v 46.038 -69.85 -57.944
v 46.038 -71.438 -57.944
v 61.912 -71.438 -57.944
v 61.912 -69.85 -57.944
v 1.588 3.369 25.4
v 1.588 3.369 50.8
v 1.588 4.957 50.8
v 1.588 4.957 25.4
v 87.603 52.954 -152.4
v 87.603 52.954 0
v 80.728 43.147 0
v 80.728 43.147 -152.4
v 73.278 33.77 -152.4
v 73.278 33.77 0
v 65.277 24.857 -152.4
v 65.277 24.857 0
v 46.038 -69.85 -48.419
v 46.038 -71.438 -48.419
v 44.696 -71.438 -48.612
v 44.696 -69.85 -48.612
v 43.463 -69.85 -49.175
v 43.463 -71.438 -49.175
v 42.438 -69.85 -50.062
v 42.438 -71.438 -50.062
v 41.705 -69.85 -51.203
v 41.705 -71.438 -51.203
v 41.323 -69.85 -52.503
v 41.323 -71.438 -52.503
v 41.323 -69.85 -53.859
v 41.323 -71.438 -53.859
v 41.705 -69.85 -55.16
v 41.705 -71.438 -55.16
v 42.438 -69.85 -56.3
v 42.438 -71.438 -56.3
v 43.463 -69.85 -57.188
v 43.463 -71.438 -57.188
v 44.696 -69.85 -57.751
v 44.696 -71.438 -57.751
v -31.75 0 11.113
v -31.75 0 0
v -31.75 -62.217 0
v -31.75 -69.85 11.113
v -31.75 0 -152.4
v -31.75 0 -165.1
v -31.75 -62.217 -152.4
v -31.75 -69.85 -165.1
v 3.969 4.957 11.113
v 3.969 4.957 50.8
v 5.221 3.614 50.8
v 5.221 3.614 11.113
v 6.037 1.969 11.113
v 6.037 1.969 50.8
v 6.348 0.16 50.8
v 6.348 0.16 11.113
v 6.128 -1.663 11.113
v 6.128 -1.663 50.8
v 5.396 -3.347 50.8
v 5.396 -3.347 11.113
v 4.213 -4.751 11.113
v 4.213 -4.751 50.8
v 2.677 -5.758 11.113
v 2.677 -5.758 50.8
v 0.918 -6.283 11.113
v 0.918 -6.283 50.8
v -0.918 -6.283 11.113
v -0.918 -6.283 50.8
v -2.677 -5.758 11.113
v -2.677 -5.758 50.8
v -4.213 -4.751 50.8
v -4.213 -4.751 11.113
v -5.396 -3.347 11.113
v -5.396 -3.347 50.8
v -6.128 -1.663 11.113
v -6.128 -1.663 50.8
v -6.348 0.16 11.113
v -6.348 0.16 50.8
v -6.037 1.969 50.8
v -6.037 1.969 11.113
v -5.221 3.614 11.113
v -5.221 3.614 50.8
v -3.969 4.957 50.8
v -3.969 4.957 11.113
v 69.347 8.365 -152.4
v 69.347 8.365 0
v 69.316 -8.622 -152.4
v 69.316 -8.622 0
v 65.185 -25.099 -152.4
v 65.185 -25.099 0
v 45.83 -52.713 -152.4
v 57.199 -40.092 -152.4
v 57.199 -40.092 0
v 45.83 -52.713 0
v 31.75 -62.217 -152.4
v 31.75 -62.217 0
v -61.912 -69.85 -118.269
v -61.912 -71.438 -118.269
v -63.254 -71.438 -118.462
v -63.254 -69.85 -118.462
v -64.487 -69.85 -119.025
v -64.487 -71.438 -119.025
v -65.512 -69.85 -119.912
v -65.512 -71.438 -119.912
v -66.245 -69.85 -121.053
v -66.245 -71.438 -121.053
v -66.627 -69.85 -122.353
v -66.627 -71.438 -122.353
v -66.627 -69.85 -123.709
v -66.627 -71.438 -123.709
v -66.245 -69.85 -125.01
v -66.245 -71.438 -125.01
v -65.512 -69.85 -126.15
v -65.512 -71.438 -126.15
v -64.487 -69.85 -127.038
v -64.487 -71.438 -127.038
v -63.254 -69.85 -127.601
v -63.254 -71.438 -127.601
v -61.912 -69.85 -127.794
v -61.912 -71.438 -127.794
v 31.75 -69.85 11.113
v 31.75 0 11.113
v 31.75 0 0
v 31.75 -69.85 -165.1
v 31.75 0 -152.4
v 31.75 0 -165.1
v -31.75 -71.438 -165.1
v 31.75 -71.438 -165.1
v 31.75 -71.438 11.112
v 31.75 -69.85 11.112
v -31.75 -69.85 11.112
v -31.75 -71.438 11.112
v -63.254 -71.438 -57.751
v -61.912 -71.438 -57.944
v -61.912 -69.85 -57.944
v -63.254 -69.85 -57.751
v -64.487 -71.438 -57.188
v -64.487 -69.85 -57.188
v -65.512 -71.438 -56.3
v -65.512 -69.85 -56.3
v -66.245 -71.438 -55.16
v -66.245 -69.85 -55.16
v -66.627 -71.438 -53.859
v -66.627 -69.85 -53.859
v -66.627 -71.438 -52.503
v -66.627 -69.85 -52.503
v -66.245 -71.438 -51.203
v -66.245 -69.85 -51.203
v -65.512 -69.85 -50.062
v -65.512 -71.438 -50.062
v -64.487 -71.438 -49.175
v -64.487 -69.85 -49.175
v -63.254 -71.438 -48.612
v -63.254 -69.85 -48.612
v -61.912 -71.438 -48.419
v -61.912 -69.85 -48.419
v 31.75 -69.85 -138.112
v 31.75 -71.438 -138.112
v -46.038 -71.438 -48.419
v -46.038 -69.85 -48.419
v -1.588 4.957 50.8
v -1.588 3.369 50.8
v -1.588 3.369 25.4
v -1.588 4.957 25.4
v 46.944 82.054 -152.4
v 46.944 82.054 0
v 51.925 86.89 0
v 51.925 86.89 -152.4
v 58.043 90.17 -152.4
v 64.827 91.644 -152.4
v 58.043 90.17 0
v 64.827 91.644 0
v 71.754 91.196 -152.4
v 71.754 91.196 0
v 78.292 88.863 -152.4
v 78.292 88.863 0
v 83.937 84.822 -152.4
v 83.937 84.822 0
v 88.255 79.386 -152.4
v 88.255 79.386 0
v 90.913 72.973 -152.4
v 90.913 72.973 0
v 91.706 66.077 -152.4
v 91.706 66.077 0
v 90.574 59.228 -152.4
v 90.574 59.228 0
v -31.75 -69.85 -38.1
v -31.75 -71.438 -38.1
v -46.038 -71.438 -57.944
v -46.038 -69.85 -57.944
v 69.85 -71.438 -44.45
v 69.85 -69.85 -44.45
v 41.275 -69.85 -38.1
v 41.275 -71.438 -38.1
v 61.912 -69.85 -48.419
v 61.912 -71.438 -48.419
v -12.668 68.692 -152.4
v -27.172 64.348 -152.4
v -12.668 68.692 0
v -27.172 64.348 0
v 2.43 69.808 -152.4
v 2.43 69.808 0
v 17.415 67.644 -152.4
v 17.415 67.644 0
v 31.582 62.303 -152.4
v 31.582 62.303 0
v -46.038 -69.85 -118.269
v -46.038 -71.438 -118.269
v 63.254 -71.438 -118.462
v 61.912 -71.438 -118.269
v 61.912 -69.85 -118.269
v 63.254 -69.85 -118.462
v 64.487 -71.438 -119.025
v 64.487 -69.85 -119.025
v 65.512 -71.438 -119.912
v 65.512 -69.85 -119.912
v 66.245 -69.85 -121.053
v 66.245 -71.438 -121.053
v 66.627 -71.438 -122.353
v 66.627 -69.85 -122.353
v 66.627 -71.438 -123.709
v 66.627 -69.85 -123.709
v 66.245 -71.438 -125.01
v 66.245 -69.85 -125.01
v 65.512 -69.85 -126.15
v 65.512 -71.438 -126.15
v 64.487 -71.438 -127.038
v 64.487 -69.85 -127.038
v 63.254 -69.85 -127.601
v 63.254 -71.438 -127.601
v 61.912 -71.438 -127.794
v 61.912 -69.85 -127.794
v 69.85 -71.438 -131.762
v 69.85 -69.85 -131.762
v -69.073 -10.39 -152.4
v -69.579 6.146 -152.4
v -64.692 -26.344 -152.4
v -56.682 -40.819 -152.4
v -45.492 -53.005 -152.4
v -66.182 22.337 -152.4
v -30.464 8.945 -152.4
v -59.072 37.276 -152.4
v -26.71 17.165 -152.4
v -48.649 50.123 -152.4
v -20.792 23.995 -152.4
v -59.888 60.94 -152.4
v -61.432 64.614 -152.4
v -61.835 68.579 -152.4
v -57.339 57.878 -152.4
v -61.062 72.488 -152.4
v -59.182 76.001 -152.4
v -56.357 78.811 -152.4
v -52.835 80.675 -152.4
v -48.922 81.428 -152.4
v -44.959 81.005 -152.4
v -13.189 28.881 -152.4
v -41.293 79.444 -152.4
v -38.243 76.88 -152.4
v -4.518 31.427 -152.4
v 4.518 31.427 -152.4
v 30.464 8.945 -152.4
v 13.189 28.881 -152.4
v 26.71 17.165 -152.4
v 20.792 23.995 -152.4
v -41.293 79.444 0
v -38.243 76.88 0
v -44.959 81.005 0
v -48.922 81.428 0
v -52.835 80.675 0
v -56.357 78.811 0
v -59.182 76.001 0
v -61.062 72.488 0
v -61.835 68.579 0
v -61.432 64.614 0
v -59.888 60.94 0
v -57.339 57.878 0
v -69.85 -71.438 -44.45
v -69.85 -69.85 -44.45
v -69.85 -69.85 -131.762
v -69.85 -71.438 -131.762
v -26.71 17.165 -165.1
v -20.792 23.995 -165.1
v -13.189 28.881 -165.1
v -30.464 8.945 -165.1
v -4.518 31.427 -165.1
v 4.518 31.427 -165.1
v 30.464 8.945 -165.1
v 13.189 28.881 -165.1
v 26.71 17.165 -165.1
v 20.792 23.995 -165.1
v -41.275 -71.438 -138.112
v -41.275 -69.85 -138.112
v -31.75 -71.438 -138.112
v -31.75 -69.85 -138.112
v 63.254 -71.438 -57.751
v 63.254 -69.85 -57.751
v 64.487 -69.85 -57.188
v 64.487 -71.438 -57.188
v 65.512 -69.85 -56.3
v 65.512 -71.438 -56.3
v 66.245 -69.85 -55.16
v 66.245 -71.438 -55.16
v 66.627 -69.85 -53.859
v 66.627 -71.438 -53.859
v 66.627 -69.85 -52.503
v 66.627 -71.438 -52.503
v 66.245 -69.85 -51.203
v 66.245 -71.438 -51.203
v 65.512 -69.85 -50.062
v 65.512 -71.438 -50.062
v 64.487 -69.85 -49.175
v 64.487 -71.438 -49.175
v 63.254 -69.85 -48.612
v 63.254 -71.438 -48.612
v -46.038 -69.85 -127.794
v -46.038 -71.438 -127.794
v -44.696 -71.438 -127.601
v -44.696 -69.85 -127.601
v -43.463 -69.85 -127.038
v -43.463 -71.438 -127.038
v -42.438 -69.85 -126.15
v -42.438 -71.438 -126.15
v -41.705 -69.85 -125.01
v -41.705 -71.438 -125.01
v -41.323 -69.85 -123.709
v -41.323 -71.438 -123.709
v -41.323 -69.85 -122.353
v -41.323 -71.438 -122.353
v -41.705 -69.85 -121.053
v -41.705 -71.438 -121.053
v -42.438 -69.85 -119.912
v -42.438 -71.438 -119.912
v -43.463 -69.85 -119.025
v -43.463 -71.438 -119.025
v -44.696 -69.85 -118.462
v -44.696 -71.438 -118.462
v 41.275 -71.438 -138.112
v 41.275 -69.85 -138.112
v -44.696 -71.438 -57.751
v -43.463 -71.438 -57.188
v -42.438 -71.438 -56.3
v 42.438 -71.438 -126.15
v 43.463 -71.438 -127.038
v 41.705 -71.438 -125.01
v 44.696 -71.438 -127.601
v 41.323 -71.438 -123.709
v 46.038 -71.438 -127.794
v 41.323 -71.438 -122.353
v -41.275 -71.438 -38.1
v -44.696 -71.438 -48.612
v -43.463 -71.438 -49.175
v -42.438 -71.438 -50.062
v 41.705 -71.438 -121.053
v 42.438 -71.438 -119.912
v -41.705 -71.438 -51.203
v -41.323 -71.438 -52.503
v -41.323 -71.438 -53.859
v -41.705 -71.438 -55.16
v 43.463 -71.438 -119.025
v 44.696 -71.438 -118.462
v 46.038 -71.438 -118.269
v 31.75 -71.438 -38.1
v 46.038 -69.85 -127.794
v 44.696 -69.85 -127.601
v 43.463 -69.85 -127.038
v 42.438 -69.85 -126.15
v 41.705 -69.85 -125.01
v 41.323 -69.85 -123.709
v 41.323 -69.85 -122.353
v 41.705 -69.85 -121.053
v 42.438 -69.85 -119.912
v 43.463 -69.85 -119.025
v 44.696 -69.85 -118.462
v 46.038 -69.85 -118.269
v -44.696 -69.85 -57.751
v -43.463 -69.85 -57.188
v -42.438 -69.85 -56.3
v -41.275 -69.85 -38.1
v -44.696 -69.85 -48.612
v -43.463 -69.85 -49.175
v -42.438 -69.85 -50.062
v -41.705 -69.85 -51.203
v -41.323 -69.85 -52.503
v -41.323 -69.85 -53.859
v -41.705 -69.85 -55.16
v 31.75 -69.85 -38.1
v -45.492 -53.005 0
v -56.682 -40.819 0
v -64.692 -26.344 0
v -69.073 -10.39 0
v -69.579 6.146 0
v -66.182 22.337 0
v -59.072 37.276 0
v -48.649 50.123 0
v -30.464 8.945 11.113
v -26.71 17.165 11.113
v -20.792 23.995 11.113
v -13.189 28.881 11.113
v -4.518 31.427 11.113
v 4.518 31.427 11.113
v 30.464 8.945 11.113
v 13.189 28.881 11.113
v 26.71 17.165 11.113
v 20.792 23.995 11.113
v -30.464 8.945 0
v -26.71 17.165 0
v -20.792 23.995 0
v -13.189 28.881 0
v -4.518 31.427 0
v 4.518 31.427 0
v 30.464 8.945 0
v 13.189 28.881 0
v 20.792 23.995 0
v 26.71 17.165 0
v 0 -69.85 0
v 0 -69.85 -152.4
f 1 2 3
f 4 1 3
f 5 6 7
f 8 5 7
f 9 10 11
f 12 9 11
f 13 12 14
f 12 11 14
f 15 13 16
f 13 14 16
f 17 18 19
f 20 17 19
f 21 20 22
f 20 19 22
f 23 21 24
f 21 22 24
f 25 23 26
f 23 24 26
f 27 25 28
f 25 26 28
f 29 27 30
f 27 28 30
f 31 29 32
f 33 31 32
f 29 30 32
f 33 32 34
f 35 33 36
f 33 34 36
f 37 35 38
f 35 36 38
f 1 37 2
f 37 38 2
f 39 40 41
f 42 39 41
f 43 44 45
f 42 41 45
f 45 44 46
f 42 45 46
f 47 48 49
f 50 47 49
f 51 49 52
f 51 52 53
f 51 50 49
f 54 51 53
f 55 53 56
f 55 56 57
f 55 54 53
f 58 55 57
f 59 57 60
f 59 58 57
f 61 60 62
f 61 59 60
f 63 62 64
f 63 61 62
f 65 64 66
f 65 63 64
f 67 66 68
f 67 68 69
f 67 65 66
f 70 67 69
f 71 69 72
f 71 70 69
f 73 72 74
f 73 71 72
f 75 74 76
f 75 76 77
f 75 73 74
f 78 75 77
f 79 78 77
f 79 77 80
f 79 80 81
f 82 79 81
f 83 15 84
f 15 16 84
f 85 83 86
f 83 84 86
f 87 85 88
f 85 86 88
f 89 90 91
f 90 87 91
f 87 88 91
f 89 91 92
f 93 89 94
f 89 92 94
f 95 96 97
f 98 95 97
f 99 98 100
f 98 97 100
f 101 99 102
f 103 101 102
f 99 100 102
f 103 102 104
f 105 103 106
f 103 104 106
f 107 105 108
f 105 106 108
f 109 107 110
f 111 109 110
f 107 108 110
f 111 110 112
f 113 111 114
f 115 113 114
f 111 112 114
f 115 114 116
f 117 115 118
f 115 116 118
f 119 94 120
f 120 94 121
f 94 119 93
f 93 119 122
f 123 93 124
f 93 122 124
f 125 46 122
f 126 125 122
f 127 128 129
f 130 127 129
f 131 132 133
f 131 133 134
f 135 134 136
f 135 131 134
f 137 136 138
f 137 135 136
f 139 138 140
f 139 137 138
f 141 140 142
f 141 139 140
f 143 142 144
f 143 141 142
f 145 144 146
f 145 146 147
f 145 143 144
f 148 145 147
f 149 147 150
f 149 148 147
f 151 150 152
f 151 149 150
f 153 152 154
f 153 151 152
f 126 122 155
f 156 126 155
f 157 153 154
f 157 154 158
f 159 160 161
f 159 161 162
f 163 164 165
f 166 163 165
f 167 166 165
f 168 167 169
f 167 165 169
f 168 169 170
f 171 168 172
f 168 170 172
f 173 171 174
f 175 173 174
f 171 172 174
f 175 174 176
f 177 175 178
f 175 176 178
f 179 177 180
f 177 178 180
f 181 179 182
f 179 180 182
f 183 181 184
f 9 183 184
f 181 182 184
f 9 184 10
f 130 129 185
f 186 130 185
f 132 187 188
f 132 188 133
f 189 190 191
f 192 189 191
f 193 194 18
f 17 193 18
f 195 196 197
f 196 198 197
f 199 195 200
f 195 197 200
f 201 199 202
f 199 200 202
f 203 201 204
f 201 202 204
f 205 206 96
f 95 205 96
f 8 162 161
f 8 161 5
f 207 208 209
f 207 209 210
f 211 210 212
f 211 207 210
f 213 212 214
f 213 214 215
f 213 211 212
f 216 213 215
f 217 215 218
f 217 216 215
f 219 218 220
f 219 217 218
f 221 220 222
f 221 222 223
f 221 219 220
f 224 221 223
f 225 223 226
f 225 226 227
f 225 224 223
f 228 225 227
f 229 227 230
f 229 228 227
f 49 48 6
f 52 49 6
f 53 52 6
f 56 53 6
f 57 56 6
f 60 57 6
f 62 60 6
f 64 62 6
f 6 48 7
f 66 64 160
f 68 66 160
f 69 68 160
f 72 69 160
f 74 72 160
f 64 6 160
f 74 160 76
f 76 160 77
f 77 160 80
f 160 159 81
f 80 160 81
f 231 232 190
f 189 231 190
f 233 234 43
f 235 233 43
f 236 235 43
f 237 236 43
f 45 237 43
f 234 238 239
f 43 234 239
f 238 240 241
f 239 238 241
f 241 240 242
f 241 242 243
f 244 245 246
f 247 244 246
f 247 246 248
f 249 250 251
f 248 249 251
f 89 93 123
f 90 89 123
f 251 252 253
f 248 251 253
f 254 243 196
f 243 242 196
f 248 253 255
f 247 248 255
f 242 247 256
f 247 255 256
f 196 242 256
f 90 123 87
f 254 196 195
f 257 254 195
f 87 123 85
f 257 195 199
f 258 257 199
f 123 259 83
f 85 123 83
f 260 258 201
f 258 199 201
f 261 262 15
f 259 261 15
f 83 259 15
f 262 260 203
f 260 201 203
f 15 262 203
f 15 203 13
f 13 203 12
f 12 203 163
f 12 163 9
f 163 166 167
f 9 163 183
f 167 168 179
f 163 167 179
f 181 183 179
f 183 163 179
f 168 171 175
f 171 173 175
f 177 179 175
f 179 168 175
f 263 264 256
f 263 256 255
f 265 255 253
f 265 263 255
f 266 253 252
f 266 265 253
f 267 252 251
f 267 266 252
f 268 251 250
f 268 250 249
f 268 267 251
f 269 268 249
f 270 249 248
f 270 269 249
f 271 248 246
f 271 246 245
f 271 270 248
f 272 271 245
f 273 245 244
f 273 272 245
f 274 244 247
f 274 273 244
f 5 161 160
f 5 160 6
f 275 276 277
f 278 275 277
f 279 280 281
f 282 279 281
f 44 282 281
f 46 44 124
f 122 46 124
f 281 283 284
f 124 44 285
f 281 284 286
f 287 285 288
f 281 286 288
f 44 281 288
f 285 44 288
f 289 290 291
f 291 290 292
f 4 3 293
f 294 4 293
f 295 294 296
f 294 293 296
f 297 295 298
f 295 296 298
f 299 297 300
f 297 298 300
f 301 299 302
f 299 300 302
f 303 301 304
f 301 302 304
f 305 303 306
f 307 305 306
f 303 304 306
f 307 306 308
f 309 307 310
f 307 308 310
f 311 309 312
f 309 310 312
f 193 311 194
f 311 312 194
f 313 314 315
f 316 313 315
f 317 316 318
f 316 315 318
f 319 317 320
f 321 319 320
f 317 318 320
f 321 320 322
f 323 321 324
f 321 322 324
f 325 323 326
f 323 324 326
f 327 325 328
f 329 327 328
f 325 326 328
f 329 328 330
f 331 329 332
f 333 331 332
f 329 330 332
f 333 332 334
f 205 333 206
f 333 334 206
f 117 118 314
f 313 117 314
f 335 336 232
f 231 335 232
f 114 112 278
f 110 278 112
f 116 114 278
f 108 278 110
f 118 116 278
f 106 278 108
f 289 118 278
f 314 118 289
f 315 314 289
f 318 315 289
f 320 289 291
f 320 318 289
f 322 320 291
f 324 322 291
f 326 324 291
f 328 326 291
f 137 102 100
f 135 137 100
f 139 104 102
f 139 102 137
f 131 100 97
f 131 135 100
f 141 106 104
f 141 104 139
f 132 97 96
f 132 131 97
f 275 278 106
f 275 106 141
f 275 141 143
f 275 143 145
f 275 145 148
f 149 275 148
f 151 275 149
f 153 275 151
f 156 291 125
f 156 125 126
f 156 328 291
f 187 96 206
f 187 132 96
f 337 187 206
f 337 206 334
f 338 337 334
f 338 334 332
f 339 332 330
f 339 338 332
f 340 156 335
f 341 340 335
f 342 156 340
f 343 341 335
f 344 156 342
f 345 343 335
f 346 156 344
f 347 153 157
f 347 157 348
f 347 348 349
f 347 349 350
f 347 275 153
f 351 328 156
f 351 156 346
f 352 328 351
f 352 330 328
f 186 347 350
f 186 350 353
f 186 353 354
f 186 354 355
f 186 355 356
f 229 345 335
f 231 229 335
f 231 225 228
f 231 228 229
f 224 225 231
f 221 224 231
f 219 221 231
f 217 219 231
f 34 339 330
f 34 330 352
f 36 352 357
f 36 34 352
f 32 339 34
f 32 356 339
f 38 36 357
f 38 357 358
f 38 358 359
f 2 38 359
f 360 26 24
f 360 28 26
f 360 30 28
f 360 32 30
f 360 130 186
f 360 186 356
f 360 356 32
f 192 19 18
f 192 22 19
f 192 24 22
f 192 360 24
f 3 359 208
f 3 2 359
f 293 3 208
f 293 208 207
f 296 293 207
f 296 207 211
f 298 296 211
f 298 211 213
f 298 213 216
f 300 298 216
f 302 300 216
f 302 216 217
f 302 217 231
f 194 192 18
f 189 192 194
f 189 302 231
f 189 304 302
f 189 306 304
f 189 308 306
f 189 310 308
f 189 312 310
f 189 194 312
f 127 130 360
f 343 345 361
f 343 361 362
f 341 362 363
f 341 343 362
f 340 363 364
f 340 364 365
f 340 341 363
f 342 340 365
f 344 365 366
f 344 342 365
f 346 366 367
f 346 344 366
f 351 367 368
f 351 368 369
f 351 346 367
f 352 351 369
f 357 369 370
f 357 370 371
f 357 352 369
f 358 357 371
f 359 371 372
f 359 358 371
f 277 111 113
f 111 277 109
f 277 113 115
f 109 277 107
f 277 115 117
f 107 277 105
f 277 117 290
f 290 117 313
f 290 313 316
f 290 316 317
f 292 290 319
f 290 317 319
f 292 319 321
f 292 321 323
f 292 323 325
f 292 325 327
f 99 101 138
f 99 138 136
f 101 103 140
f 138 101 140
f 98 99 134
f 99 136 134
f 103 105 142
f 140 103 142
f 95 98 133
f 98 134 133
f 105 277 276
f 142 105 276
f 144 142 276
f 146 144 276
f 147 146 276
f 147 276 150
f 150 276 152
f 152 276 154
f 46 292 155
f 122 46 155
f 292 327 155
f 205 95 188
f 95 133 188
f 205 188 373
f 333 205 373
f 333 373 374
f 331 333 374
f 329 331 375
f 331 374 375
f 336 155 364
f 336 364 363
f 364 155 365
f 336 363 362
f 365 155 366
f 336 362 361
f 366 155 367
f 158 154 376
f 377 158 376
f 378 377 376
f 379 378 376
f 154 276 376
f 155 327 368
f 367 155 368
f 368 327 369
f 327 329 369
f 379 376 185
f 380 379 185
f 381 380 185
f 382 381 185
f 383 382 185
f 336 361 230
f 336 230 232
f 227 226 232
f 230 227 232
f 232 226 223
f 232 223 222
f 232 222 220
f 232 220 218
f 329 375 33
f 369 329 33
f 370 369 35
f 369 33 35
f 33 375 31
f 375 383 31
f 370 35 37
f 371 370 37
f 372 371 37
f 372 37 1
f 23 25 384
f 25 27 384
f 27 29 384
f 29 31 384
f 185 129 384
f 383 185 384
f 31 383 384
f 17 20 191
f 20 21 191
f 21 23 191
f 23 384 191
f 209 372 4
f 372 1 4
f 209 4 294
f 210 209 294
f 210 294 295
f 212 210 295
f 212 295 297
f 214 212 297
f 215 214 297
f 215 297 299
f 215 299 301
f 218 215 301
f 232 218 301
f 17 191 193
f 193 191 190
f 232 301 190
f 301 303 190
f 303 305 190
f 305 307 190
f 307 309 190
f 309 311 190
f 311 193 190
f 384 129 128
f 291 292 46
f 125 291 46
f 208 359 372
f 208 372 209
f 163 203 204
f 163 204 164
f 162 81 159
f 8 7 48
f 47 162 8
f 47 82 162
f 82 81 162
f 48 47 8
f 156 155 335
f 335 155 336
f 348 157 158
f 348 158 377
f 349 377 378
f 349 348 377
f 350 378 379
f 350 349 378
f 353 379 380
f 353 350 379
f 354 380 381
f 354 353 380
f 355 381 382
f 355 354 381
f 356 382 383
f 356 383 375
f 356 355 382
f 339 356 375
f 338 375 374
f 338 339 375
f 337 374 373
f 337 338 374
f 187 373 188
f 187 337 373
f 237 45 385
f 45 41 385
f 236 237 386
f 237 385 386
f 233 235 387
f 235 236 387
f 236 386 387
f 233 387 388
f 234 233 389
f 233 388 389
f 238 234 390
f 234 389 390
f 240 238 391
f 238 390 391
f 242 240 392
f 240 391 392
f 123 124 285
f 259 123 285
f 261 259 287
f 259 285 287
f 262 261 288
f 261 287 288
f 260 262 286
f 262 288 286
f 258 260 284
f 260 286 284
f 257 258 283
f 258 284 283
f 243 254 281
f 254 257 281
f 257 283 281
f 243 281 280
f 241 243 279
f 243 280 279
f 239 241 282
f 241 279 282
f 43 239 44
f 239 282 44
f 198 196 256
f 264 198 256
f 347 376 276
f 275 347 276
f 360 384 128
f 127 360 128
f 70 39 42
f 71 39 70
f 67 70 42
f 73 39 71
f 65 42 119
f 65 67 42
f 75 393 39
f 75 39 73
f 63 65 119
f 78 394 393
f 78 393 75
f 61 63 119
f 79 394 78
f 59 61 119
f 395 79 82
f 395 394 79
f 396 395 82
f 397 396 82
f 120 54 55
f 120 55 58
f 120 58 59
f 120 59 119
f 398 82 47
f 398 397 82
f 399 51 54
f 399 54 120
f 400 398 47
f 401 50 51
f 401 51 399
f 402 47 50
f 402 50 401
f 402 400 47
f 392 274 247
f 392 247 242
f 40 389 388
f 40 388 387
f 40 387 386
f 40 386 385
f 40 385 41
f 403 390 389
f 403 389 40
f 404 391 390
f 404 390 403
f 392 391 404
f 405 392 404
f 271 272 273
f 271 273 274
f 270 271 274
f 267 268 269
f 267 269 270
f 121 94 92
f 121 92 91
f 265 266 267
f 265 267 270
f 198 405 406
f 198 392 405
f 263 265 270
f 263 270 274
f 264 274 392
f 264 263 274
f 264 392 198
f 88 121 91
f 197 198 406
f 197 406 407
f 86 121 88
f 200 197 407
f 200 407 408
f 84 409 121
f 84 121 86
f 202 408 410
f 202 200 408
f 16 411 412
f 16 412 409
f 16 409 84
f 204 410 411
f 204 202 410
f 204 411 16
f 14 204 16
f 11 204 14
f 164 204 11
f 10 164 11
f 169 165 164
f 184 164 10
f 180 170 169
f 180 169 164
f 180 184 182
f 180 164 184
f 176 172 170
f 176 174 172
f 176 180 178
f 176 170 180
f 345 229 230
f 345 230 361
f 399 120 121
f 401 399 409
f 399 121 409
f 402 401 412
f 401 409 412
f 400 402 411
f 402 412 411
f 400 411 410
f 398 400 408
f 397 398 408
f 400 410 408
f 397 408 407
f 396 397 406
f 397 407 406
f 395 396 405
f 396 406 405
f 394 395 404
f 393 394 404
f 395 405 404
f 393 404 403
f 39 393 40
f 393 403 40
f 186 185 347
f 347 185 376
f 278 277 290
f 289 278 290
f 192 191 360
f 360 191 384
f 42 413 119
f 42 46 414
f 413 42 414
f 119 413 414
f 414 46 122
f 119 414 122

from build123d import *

# Parameters (mm, degrees)
BOSS_EXTRUDE1_DEPTH      = 50.8
SKETCH2_R                = 69.85
BOSS_EXTRUDE2_DEPTH      = 152.4
BOSS_EXTRUDE3_DEPTH      = 11.1125
BOSS_EXTRUDE3_DEPTH_BACK = 165.1
BOSS_EXTRUDE4_DEPTH      = 1.5875
CUT_EXTRUDE1_DEPTH       = 1.5875
BOSS_EXTRUDE5_DEPTH      = 152.4
SKETCH7_W                = 3.175
SKETCH7_H                = 1.5875
CUT_EXTRUDE2_DEPTH       = 25.4


with BuildPart() as part:
    # Sketch1 → Boss-Extrude1 (new body)
    with BuildSketch(Plane.XY):
        with BuildLine():
            Line((-3.96875, 4.956967161), (3.96875, 4.956967161))
            ThreePointArc((3.96875, 4.956967161), (0, -6.35), (-3.96875, 4.956967161))
        make_face()
    extrude(amount=BOSS_EXTRUDE1_DEPTH)

    # Sketch2 → Boss-Extrude2 (add)
    with BuildSketch(Plane(origin=(0, 0, 0), x_dir=(-1, 0, 0), z_dir=(0, 0, -1))):
        with Locations(Location((0, 0, 0), (0, 0, 180))):
            Circle(SKETCH2_R)
    extrude(amount=BOSS_EXTRUDE2_DEPTH)

    # Sketch3 → Boss-Extrude3 (add, two sides: drawn at the far end of the back side and taken through both)
    with BuildSketch(Plane.XY.offset(-BOSS_EXTRUDE3_DEPTH_BACK)):
        with BuildLine():
            Line((-31.75, 0), (-31.75, -69.85))
            Line((-31.75, -69.85), (31.75, -69.85))
            Line((31.75, -69.85), (31.75, 0))
            ThreePointArc((31.75, 0), (0, 31.75), (-31.75, 0))
        make_face()
    extrude(amount=BOSS_EXTRUDE3_DEPTH + BOSS_EXTRUDE3_DEPTH_BACK)

    # Sketch6 → Boss-Extrude5 (add)
    with BuildSketch(Plane.XY):
        with BuildLine():
            Line((-57.339496862, 57.877511192), (-43.213350378, 45.2729749))
            Line((-43.213350378, 45.2729749), (-24.981535219, 61.868601519))
            Line((-24.981535219, 61.868601519), (-38.242972103, 76.879791128))
            ThreePointArc((-38.242972103, 76.879791128), (-57.873547409, 77.510968918), (-57.339496862, 57.877511192))
        make_face()
        with BuildLine():
            Line((22.296433765, 50.36440818), (46.944158333, 82.054339768))
            ThreePointArc((46.944158333, 82.054339768), (81.255533225, 87.039254438), (87.603107082, 52.953654438))
            ThreePointArc((87.603107082, 52.953654438), (74.164851505, 34.827489865), (58.76527868, 18.335136731))
            ThreePointArc((58.76527868, 18.335136731), (42.207462237, 36.258772628), (22.296433765, 50.36440818))
        make_face()
    extrude(amount=-BOSS_EXTRUDE5_DEPTH)

    # Sketch7 → Cut-Extrude2 (cut)
    with BuildSketch(Plane.XY.offset(50.8)):
        with Locations((0, 4.163217161)):
            Rectangle(SKETCH7_W, SKETCH7_H)
    extrude(amount=-CUT_EXTRUDE2_DEPTH, mode=Mode.SUBTRACT)


with BuildPart() as body_2:
    # Sketch4 → Boss-Extrude4 (new body)
    with BuildSketch(Plane.XZ.offset(69.85)):
        Polygon((-41.275, -38.1), (-69.85, -44.45), (-69.85, -131.7625), (-41.275, -138.1125), (-31.75, -138.1125), (-31.75, -165.1), (31.75, -165.1), (31.75, -138.1125), (41.275, -138.1125), (69.85, -131.7625), (69.85, -44.45), (41.275, -38.1), (31.75, -38.1), (31.75, 11.1125), (-31.75, 11.1125), (-31.75, -38.1), align=None)
    extrude(amount=BOSS_EXTRUDE4_DEPTH)

    # Sketch5 → Cut-Extrude1 (cut)
    with BuildSketch(Plane.XZ.offset(71.4375)):
        with BuildLine():
            Line((-61.9125, -48.41875), (-46.0375, -48.41875))
            ThreePointArc((-46.0375, -48.41875), (-41.275, -53.18125), (-46.0375, -57.94375))
            Line((-46.0375, -57.94375), (-61.9125, -57.94375))
            ThreePointArc((-61.9125, -57.94375), (-66.675, -53.18125), (-61.9125, -48.41875))
        make_face()
        with BuildLine():
            Line((-61.9125, -127.79375), (-46.0375, -127.79375))
            ThreePointArc((-46.0375, -127.79375), (-41.275, -123.03125), (-46.0375, -118.26875))
            Line((-46.0375, -118.26875), (-61.9125, -118.26875))
            ThreePointArc((-61.9125, -118.26875), (-66.675, -123.03125), (-61.9125, -127.79375))
        make_face()
    cut_extrude1 = extrude(amount=-CUT_EXTRUDE1_DEPTH, mode=Mode.SUBTRACT)

    # Mirror1: Cut-Extrude1 across plane
    add(cut_extrude1.mirror(Plane(origin=(0, 0, 0), x_dir=(0, 0, 1), z_dir=(1, 0, 0))), mode=Mode.SUBTRACT)


solid = Compound([part.part, body_2.part])
